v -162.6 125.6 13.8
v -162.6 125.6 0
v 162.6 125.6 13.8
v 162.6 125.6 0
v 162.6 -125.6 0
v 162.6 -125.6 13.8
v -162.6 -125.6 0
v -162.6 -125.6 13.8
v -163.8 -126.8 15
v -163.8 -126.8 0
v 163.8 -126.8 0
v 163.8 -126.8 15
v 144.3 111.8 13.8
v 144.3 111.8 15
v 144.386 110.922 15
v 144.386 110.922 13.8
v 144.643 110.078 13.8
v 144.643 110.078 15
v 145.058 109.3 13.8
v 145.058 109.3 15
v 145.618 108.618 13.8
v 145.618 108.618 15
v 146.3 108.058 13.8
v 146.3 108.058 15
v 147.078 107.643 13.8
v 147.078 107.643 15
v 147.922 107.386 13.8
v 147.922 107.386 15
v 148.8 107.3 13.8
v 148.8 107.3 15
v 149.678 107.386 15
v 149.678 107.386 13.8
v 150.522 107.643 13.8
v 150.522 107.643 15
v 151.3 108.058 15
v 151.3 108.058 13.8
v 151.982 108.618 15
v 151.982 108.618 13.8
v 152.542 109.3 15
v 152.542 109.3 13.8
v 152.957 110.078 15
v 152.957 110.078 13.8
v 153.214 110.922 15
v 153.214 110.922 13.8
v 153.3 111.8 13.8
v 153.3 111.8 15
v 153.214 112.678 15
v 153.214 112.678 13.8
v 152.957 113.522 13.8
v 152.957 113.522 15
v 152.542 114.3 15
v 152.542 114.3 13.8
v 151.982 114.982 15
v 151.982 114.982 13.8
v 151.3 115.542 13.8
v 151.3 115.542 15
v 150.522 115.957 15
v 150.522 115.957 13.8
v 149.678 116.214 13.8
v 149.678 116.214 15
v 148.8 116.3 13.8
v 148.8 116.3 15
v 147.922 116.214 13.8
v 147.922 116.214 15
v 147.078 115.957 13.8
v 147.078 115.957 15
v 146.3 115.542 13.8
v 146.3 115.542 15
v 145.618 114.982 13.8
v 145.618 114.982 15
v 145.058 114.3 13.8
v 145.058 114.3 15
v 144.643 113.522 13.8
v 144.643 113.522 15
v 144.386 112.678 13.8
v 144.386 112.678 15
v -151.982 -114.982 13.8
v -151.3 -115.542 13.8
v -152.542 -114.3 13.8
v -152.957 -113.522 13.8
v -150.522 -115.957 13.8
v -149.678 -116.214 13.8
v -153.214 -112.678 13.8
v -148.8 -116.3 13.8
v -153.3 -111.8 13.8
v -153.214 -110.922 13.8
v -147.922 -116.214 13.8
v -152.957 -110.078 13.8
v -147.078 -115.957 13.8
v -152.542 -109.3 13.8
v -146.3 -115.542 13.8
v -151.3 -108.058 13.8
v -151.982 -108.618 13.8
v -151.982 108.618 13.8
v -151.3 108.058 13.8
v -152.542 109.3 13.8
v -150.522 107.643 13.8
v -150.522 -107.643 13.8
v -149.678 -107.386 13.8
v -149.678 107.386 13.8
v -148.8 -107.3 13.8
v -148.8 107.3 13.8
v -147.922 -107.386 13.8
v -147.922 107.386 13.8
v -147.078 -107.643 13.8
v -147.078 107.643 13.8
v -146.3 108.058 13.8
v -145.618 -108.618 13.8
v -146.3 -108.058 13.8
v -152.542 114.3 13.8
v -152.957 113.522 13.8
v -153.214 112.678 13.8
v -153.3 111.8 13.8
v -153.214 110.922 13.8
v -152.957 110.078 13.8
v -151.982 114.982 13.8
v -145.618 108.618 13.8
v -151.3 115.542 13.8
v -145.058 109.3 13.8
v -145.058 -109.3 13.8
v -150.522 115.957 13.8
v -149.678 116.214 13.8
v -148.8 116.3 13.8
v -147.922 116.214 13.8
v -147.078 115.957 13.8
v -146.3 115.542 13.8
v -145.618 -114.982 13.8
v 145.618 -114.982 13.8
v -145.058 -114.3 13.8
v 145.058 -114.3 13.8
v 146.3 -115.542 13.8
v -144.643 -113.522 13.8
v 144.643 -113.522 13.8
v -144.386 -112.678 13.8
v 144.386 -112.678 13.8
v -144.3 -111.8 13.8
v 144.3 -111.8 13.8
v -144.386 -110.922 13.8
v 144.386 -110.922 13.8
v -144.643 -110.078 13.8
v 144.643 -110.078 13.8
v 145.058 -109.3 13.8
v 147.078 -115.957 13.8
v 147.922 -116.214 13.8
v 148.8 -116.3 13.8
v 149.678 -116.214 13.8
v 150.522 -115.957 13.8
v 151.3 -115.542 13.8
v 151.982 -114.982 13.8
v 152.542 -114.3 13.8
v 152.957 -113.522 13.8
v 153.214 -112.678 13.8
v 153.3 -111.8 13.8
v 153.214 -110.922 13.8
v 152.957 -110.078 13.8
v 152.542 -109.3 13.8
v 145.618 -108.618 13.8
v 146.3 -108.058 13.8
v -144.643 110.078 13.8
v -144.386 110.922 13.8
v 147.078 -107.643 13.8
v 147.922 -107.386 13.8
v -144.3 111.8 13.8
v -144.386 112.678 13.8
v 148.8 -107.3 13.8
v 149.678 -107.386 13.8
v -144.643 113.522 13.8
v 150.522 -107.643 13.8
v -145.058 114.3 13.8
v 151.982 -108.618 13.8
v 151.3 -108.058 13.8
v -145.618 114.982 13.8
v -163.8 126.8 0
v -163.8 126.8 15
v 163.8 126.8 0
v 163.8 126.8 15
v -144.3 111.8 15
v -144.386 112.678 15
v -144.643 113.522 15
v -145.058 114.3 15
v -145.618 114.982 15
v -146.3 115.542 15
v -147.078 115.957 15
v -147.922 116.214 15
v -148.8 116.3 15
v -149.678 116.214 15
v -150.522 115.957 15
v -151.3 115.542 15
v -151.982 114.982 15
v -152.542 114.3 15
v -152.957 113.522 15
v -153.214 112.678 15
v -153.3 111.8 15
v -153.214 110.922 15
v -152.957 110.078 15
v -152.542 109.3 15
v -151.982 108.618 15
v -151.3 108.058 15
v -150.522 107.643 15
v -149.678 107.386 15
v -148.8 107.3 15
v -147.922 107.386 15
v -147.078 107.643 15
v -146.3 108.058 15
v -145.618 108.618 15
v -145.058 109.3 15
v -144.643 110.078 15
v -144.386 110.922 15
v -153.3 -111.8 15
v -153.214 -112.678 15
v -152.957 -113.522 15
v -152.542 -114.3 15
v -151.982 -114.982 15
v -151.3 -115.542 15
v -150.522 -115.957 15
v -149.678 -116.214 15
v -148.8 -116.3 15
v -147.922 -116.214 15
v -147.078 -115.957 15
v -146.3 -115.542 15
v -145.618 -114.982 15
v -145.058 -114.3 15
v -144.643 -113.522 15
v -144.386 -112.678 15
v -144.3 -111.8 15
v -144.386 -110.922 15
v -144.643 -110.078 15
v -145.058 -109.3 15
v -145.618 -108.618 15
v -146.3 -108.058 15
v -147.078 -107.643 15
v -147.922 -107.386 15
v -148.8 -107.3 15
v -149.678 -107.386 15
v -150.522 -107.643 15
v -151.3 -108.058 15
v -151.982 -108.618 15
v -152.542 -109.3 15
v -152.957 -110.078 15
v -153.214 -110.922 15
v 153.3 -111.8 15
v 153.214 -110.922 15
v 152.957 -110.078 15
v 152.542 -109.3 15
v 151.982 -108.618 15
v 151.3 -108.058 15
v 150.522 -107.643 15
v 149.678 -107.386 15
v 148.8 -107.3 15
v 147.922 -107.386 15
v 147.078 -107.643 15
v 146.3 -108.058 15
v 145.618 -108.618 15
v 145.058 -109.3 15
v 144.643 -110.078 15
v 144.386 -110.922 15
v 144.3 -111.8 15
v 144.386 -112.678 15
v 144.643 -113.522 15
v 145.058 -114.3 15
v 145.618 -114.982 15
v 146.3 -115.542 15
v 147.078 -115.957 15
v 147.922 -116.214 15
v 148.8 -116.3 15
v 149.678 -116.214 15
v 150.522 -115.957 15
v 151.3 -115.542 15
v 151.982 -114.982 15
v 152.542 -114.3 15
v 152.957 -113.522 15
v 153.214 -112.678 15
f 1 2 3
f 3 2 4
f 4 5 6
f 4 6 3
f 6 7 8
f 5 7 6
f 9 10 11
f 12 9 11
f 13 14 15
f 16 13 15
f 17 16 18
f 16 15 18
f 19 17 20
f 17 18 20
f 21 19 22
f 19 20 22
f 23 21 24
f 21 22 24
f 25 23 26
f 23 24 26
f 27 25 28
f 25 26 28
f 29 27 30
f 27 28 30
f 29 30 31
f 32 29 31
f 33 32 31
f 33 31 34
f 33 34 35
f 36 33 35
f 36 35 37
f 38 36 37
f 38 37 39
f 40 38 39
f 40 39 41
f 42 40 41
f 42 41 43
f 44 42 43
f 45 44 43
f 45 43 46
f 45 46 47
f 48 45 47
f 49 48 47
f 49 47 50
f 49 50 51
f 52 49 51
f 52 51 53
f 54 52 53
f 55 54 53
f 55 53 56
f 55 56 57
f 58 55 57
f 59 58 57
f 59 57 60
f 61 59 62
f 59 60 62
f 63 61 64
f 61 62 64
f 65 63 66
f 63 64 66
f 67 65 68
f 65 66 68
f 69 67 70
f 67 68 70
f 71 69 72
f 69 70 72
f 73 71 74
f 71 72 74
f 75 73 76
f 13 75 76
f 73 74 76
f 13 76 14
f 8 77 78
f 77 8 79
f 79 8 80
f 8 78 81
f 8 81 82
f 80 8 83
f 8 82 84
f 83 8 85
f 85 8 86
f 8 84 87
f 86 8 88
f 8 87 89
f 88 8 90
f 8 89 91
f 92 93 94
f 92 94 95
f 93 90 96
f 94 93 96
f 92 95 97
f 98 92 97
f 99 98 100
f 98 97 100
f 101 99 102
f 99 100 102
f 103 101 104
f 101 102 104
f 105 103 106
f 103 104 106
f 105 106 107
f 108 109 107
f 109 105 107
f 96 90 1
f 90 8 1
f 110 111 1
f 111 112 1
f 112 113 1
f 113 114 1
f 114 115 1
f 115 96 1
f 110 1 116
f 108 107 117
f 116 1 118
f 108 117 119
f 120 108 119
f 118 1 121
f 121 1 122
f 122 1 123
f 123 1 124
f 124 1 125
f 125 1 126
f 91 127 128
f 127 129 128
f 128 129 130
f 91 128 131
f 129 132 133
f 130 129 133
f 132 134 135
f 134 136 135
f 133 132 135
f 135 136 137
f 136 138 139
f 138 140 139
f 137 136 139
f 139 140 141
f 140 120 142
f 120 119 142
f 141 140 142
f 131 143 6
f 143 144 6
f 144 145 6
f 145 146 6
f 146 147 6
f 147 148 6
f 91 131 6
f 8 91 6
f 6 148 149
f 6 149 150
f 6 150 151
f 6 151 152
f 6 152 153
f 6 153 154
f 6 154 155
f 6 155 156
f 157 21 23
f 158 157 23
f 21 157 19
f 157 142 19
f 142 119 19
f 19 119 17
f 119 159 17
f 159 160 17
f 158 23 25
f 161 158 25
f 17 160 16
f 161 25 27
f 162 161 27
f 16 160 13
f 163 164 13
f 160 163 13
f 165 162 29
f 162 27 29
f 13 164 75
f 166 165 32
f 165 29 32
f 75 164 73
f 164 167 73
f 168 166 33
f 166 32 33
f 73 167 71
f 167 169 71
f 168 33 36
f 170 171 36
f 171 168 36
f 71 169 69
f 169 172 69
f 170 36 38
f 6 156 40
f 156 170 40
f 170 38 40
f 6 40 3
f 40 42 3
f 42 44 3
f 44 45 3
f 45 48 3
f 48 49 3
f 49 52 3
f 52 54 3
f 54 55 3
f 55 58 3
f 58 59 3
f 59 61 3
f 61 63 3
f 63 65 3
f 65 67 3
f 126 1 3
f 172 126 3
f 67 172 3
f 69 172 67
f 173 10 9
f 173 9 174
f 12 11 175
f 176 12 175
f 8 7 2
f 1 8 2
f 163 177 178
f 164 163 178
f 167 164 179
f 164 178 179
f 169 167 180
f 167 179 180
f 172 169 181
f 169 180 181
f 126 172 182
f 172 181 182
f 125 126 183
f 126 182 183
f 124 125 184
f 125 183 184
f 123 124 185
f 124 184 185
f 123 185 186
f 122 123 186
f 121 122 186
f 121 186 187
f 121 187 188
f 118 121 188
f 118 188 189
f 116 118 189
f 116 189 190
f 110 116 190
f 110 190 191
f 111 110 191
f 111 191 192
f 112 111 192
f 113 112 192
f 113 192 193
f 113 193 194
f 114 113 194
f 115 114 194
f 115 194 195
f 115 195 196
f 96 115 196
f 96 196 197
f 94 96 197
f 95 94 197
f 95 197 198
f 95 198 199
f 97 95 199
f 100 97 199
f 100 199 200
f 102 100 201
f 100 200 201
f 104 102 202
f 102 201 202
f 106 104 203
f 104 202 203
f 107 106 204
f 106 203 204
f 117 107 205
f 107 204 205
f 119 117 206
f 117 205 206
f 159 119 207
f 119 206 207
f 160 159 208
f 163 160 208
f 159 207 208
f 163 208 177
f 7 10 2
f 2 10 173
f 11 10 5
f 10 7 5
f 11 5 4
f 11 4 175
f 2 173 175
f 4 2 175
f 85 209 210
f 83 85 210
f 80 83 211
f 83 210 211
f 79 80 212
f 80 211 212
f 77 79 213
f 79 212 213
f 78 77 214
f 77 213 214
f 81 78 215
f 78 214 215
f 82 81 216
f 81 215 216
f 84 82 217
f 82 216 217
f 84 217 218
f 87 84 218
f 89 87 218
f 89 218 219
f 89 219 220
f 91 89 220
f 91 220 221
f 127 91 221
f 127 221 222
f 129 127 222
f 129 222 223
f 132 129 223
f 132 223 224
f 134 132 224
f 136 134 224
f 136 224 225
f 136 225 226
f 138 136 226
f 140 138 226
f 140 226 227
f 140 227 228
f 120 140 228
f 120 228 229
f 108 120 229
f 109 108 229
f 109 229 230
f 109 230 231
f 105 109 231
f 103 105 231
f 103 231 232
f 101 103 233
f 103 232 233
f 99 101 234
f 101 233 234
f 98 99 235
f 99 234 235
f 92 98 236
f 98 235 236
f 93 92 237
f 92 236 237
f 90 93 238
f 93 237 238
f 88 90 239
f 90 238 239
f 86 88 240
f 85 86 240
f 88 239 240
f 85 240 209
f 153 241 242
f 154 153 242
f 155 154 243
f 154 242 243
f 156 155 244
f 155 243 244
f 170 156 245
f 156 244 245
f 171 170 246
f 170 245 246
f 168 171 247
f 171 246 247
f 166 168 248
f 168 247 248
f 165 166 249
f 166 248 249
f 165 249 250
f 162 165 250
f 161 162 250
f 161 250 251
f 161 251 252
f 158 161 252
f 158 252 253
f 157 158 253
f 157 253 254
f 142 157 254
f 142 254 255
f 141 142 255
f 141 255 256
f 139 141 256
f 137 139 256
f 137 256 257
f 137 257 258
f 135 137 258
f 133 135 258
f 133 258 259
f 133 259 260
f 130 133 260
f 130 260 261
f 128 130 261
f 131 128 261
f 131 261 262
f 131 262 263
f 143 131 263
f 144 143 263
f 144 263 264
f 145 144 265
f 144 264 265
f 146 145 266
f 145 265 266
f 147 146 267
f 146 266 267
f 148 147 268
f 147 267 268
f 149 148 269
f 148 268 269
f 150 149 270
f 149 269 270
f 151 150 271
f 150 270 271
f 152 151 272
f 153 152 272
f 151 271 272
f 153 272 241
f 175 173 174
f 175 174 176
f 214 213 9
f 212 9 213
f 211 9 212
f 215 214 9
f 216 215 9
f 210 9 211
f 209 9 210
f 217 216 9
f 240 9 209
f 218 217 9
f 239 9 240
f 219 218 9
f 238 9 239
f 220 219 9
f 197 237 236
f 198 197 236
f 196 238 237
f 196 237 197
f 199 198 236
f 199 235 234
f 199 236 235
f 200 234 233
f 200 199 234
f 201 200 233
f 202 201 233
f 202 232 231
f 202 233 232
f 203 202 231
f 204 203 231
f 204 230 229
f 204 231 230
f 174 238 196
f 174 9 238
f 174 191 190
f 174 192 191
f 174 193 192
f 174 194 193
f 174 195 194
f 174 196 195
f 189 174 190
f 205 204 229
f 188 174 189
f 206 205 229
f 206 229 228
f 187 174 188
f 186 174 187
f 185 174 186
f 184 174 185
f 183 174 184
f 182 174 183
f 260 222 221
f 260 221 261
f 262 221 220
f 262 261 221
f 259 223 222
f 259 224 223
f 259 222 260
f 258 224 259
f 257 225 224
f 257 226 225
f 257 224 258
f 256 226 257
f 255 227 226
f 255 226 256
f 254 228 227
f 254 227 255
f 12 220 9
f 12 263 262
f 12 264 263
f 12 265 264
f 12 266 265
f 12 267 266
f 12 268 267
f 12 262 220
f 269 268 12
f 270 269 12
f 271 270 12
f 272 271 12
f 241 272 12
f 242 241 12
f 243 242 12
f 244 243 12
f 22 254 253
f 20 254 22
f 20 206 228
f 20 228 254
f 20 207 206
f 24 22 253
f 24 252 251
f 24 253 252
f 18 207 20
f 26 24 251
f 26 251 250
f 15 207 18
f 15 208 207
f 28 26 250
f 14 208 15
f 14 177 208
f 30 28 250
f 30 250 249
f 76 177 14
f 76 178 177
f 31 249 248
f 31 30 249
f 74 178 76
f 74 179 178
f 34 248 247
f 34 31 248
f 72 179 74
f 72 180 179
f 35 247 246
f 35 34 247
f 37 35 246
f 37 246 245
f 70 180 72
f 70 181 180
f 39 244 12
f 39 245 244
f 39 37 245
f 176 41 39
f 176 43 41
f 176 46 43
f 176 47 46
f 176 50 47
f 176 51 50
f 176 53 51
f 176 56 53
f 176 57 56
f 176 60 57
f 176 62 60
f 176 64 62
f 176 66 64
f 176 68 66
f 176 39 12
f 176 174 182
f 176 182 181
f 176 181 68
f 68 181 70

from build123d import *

# Parameters (mm, degrees)
SKETCH_1_W          = 327.6
SKETCH_1_H          = 253.6
EXTRUDE_1_DEPTH     = 15
SHELL_1_T           = -1.2
SKETCH_2_R          = 4.5
CUT_EXTRUDE_1_DEPTH = 15


with BuildPart() as part:
    # 草图1 → 凸台-拉伸1 (new body)
    with BuildSketch(Plane.XY):
        Rectangle(SKETCH_1_W, SKETCH_1_H)
    extrude(amount=EXTRUDE_1_DEPTH)

    # 抽壳1
    shell_1_openings = [part.faces().sort_by_distance(p)[0] for p in [
        (0, 0, 0),
    ]]
    offset(amount=SHELL_1_T, openings=shell_1_openings, kind=Kind.INTERSECTION)

    # 草图2 → 切除-拉伸1 (cut)
    with BuildSketch(Plane.XY.offset(15)):
        with Locations((-148.8, 111.8)):
            Circle(SKETCH_2_R)
        with Locations(Location((148.8, 111.8, 0), (0, 0, 180))):
            Circle(SKETCH_2_R)
        with Locations((148.8, -111.8)):
            Circle(SKETCH_2_R)
        with Locations(Location((-148.8, -111.8, 0), (0, 0, 180))):
            Circle(SKETCH_2_R)
    extrude(amount=-CUT_EXTRUDE_1_DEPTH, mode=Mode.SUBTRACT)


solid = part.part
